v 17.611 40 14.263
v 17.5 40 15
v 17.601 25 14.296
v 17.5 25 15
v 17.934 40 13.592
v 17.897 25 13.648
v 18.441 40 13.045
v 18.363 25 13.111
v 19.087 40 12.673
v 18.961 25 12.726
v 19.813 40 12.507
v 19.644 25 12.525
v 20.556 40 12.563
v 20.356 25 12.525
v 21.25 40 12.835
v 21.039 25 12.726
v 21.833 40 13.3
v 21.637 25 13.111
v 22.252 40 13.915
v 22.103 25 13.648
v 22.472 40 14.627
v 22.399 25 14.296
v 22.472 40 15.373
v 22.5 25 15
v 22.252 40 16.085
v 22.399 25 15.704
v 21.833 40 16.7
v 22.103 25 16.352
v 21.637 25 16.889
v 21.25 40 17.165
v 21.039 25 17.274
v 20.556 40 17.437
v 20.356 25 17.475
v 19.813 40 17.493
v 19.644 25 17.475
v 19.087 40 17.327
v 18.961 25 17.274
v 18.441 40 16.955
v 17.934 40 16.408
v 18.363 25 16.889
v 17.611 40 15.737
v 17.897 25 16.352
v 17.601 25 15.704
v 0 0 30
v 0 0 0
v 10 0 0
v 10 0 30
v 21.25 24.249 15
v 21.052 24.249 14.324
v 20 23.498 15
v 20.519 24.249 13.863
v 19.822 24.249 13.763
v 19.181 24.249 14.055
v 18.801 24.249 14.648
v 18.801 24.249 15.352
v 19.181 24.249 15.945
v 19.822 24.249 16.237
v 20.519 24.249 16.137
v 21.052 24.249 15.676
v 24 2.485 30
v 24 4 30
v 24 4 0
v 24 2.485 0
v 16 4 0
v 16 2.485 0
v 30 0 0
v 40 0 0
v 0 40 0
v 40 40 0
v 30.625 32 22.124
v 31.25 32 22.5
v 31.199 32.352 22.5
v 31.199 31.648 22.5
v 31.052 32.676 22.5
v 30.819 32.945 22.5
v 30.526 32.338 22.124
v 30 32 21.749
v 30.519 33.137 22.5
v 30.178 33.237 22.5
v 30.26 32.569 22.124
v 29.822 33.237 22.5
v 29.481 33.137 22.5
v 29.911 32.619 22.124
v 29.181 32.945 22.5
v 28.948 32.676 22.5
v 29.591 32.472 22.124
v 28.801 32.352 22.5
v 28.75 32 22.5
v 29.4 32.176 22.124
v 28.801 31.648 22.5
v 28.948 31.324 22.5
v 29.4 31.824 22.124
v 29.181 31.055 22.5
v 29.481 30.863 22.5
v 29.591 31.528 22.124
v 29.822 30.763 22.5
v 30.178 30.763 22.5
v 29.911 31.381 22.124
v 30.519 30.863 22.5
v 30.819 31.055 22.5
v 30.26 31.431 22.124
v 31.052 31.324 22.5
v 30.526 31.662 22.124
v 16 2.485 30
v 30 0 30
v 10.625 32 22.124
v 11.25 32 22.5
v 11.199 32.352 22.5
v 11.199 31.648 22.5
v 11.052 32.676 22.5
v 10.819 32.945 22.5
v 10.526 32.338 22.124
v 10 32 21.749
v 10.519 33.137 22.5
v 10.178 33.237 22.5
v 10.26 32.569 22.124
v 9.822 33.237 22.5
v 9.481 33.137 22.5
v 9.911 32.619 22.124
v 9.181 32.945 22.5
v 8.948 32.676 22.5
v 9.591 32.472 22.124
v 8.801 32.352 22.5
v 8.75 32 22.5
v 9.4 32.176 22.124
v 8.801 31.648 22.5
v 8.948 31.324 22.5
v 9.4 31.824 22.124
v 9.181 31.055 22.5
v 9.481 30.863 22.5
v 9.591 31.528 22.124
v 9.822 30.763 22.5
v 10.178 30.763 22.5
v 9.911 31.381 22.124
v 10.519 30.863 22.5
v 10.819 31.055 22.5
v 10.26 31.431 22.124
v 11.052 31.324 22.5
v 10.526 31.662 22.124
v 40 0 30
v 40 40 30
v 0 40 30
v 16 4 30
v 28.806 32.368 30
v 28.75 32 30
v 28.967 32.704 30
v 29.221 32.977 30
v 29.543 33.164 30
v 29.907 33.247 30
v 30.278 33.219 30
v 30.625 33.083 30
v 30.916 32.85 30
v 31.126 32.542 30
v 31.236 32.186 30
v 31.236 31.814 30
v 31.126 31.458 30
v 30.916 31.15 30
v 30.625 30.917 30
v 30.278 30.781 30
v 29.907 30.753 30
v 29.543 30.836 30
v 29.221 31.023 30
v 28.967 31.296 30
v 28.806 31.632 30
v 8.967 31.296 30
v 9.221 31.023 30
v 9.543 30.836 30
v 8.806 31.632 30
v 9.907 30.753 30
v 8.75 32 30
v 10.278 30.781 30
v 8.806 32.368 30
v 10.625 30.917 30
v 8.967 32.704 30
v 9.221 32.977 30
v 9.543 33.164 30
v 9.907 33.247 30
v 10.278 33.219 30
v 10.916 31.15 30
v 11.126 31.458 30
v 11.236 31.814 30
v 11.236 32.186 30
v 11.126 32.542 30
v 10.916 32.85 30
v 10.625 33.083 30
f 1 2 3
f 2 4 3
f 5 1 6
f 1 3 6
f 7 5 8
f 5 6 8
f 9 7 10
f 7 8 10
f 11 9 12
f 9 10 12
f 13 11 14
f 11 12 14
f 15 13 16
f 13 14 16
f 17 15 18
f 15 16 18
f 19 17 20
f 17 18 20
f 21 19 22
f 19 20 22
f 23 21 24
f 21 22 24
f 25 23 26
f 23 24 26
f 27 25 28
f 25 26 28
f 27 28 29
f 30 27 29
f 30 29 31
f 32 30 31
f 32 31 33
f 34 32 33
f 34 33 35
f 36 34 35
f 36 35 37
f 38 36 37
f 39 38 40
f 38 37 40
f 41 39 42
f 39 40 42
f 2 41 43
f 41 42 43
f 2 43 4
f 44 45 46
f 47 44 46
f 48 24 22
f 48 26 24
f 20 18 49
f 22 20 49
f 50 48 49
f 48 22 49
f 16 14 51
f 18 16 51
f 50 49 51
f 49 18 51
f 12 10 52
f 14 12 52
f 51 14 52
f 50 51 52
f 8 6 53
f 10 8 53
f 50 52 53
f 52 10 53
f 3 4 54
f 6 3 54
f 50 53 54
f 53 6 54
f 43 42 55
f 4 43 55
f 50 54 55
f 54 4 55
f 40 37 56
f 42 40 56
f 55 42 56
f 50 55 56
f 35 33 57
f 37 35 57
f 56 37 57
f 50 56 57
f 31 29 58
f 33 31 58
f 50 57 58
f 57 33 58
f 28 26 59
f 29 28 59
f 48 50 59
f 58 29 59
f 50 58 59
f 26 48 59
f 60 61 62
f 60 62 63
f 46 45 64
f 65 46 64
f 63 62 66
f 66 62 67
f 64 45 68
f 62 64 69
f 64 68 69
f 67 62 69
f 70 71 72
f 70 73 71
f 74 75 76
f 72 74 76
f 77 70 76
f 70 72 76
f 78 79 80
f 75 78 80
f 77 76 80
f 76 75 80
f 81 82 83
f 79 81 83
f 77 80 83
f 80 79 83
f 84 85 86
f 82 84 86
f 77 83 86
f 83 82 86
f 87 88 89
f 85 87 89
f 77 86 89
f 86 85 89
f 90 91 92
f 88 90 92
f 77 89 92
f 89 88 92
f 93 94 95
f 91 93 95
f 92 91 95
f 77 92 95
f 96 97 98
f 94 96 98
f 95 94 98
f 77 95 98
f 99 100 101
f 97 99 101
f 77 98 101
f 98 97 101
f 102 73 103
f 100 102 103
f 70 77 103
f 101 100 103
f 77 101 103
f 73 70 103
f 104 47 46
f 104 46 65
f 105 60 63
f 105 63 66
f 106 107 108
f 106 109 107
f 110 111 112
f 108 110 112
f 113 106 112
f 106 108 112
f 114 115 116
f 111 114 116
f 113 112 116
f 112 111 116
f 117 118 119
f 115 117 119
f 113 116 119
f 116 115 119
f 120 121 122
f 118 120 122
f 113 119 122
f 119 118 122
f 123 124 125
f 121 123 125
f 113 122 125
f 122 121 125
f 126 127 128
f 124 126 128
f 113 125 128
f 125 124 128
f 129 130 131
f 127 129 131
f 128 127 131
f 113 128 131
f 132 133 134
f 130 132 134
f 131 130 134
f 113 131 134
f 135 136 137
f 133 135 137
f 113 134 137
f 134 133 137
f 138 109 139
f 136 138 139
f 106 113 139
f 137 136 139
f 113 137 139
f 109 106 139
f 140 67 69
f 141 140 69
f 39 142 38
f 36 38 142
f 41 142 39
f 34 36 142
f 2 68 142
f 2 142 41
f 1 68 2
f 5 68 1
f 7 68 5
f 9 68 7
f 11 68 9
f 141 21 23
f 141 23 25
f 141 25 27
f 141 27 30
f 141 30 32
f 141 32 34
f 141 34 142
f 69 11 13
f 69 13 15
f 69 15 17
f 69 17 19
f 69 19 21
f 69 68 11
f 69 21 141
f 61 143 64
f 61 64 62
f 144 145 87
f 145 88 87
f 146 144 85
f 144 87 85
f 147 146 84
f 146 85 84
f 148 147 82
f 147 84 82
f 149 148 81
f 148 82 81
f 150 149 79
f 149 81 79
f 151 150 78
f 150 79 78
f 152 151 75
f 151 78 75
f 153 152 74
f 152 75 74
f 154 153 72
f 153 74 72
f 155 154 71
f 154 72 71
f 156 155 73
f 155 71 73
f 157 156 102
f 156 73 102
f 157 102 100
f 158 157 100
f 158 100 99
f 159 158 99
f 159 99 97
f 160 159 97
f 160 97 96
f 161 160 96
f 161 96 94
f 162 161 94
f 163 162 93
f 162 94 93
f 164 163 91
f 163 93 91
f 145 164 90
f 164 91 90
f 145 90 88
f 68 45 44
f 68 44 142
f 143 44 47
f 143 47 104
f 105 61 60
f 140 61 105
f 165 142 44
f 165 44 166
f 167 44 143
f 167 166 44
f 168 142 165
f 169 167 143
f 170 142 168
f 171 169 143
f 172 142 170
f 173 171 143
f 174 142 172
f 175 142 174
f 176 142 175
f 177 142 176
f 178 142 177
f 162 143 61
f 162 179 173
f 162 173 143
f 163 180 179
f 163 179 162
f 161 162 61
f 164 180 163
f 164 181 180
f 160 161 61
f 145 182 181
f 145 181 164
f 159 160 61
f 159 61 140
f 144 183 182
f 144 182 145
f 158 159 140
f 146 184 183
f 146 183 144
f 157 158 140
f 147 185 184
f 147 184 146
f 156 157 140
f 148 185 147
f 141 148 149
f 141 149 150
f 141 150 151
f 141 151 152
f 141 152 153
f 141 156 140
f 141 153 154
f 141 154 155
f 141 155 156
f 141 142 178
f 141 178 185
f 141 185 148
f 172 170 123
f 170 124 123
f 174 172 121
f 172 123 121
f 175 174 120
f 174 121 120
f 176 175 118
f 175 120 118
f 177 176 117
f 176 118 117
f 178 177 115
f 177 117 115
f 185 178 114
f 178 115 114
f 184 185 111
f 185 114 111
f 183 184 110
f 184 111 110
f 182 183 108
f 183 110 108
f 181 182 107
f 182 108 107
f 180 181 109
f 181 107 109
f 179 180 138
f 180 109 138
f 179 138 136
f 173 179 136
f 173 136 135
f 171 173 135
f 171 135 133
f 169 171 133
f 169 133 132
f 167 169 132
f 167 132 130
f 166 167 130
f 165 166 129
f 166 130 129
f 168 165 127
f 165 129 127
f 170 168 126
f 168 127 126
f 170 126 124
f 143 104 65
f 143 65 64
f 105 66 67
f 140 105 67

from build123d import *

# Parameters (mm, degrees)
SKETCH_1_W             = 40
SKETCH_1_H             = 40
EXTRUDE_1_DEPTH        = 30
CUT_EXTRUDE_1_DEPTH    = 65.031242374
HOLE_WIZARD_M6_1_D     = 5
HOLE_WIZARD_M6_1_DEPTH = 15
HOLE_WIZARD_M6_1_TIP   = 1.502151548
HOLE_WIZARD_M3_1_D     = 2.5
HOLE_WIZARD_M3_1_DEPTH = 7.5
HOLE_WIZARD_M3_1_TIP   = 0.751075774


with BuildPart() as part:
    # 草图1 → 凸台-拉伸1 (new body)
    with BuildSketch(Plane.XY):
        with Locations((20, 20)):
            Rectangle(SKETCH_1_W, SKETCH_1_H)
    extrude(amount=EXTRUDE_1_DEPTH)

    # 草图2 → 切除-拉伸1 (cut, through all)
    with BuildSketch(Plane.XY.offset(30)):
        Polygon((10, 0), (16, 2.485281374), (16, 4), (24, 4), (24, 2.485281374), (30, 0), align=None)
    extrude(amount=-CUT_EXTRUDE_1_DEPTH, mode=Mode.SUBTRACT)

    # M6 螺纹孔1
    with Locations(Plane(origin=(0, 40, 0), x_dir=(1, 0, 0), z_dir=(0, 1, 0))):
        with Locations((20, -15)):
            Hole(HOLE_WIZARD_M6_1_D / 2, depth=HOLE_WIZARD_M6_1_DEPTH)
            with Locations((0, 0, -(HOLE_WIZARD_M6_1_DEPTH + HOLE_WIZARD_M6_1_TIP / 2))):  # 118° drill point
                Cone(0, HOLE_WIZARD_M6_1_D / 2, HOLE_WIZARD_M6_1_TIP, mode=Mode.SUBTRACT)

    # M3 螺纹孔1
    with Locations(Plane.XY.offset(30)):
        with Locations((10, 32), (30, 32)):
            Hole(HOLE_WIZARD_M3_1_D / 2, depth=HOLE_WIZARD_M3_1_DEPTH)
            with Locations((0, 0, -(HOLE_WIZARD_M3_1_DEPTH + HOLE_WIZARD_M3_1_TIP / 2))):  # 118° drill point
                Cone(0, HOLE_WIZARD_M3_1_D / 2, HOLE_WIZARD_M3_1_TIP, mode=Mode.SUBTRACT)


solid = part.part
